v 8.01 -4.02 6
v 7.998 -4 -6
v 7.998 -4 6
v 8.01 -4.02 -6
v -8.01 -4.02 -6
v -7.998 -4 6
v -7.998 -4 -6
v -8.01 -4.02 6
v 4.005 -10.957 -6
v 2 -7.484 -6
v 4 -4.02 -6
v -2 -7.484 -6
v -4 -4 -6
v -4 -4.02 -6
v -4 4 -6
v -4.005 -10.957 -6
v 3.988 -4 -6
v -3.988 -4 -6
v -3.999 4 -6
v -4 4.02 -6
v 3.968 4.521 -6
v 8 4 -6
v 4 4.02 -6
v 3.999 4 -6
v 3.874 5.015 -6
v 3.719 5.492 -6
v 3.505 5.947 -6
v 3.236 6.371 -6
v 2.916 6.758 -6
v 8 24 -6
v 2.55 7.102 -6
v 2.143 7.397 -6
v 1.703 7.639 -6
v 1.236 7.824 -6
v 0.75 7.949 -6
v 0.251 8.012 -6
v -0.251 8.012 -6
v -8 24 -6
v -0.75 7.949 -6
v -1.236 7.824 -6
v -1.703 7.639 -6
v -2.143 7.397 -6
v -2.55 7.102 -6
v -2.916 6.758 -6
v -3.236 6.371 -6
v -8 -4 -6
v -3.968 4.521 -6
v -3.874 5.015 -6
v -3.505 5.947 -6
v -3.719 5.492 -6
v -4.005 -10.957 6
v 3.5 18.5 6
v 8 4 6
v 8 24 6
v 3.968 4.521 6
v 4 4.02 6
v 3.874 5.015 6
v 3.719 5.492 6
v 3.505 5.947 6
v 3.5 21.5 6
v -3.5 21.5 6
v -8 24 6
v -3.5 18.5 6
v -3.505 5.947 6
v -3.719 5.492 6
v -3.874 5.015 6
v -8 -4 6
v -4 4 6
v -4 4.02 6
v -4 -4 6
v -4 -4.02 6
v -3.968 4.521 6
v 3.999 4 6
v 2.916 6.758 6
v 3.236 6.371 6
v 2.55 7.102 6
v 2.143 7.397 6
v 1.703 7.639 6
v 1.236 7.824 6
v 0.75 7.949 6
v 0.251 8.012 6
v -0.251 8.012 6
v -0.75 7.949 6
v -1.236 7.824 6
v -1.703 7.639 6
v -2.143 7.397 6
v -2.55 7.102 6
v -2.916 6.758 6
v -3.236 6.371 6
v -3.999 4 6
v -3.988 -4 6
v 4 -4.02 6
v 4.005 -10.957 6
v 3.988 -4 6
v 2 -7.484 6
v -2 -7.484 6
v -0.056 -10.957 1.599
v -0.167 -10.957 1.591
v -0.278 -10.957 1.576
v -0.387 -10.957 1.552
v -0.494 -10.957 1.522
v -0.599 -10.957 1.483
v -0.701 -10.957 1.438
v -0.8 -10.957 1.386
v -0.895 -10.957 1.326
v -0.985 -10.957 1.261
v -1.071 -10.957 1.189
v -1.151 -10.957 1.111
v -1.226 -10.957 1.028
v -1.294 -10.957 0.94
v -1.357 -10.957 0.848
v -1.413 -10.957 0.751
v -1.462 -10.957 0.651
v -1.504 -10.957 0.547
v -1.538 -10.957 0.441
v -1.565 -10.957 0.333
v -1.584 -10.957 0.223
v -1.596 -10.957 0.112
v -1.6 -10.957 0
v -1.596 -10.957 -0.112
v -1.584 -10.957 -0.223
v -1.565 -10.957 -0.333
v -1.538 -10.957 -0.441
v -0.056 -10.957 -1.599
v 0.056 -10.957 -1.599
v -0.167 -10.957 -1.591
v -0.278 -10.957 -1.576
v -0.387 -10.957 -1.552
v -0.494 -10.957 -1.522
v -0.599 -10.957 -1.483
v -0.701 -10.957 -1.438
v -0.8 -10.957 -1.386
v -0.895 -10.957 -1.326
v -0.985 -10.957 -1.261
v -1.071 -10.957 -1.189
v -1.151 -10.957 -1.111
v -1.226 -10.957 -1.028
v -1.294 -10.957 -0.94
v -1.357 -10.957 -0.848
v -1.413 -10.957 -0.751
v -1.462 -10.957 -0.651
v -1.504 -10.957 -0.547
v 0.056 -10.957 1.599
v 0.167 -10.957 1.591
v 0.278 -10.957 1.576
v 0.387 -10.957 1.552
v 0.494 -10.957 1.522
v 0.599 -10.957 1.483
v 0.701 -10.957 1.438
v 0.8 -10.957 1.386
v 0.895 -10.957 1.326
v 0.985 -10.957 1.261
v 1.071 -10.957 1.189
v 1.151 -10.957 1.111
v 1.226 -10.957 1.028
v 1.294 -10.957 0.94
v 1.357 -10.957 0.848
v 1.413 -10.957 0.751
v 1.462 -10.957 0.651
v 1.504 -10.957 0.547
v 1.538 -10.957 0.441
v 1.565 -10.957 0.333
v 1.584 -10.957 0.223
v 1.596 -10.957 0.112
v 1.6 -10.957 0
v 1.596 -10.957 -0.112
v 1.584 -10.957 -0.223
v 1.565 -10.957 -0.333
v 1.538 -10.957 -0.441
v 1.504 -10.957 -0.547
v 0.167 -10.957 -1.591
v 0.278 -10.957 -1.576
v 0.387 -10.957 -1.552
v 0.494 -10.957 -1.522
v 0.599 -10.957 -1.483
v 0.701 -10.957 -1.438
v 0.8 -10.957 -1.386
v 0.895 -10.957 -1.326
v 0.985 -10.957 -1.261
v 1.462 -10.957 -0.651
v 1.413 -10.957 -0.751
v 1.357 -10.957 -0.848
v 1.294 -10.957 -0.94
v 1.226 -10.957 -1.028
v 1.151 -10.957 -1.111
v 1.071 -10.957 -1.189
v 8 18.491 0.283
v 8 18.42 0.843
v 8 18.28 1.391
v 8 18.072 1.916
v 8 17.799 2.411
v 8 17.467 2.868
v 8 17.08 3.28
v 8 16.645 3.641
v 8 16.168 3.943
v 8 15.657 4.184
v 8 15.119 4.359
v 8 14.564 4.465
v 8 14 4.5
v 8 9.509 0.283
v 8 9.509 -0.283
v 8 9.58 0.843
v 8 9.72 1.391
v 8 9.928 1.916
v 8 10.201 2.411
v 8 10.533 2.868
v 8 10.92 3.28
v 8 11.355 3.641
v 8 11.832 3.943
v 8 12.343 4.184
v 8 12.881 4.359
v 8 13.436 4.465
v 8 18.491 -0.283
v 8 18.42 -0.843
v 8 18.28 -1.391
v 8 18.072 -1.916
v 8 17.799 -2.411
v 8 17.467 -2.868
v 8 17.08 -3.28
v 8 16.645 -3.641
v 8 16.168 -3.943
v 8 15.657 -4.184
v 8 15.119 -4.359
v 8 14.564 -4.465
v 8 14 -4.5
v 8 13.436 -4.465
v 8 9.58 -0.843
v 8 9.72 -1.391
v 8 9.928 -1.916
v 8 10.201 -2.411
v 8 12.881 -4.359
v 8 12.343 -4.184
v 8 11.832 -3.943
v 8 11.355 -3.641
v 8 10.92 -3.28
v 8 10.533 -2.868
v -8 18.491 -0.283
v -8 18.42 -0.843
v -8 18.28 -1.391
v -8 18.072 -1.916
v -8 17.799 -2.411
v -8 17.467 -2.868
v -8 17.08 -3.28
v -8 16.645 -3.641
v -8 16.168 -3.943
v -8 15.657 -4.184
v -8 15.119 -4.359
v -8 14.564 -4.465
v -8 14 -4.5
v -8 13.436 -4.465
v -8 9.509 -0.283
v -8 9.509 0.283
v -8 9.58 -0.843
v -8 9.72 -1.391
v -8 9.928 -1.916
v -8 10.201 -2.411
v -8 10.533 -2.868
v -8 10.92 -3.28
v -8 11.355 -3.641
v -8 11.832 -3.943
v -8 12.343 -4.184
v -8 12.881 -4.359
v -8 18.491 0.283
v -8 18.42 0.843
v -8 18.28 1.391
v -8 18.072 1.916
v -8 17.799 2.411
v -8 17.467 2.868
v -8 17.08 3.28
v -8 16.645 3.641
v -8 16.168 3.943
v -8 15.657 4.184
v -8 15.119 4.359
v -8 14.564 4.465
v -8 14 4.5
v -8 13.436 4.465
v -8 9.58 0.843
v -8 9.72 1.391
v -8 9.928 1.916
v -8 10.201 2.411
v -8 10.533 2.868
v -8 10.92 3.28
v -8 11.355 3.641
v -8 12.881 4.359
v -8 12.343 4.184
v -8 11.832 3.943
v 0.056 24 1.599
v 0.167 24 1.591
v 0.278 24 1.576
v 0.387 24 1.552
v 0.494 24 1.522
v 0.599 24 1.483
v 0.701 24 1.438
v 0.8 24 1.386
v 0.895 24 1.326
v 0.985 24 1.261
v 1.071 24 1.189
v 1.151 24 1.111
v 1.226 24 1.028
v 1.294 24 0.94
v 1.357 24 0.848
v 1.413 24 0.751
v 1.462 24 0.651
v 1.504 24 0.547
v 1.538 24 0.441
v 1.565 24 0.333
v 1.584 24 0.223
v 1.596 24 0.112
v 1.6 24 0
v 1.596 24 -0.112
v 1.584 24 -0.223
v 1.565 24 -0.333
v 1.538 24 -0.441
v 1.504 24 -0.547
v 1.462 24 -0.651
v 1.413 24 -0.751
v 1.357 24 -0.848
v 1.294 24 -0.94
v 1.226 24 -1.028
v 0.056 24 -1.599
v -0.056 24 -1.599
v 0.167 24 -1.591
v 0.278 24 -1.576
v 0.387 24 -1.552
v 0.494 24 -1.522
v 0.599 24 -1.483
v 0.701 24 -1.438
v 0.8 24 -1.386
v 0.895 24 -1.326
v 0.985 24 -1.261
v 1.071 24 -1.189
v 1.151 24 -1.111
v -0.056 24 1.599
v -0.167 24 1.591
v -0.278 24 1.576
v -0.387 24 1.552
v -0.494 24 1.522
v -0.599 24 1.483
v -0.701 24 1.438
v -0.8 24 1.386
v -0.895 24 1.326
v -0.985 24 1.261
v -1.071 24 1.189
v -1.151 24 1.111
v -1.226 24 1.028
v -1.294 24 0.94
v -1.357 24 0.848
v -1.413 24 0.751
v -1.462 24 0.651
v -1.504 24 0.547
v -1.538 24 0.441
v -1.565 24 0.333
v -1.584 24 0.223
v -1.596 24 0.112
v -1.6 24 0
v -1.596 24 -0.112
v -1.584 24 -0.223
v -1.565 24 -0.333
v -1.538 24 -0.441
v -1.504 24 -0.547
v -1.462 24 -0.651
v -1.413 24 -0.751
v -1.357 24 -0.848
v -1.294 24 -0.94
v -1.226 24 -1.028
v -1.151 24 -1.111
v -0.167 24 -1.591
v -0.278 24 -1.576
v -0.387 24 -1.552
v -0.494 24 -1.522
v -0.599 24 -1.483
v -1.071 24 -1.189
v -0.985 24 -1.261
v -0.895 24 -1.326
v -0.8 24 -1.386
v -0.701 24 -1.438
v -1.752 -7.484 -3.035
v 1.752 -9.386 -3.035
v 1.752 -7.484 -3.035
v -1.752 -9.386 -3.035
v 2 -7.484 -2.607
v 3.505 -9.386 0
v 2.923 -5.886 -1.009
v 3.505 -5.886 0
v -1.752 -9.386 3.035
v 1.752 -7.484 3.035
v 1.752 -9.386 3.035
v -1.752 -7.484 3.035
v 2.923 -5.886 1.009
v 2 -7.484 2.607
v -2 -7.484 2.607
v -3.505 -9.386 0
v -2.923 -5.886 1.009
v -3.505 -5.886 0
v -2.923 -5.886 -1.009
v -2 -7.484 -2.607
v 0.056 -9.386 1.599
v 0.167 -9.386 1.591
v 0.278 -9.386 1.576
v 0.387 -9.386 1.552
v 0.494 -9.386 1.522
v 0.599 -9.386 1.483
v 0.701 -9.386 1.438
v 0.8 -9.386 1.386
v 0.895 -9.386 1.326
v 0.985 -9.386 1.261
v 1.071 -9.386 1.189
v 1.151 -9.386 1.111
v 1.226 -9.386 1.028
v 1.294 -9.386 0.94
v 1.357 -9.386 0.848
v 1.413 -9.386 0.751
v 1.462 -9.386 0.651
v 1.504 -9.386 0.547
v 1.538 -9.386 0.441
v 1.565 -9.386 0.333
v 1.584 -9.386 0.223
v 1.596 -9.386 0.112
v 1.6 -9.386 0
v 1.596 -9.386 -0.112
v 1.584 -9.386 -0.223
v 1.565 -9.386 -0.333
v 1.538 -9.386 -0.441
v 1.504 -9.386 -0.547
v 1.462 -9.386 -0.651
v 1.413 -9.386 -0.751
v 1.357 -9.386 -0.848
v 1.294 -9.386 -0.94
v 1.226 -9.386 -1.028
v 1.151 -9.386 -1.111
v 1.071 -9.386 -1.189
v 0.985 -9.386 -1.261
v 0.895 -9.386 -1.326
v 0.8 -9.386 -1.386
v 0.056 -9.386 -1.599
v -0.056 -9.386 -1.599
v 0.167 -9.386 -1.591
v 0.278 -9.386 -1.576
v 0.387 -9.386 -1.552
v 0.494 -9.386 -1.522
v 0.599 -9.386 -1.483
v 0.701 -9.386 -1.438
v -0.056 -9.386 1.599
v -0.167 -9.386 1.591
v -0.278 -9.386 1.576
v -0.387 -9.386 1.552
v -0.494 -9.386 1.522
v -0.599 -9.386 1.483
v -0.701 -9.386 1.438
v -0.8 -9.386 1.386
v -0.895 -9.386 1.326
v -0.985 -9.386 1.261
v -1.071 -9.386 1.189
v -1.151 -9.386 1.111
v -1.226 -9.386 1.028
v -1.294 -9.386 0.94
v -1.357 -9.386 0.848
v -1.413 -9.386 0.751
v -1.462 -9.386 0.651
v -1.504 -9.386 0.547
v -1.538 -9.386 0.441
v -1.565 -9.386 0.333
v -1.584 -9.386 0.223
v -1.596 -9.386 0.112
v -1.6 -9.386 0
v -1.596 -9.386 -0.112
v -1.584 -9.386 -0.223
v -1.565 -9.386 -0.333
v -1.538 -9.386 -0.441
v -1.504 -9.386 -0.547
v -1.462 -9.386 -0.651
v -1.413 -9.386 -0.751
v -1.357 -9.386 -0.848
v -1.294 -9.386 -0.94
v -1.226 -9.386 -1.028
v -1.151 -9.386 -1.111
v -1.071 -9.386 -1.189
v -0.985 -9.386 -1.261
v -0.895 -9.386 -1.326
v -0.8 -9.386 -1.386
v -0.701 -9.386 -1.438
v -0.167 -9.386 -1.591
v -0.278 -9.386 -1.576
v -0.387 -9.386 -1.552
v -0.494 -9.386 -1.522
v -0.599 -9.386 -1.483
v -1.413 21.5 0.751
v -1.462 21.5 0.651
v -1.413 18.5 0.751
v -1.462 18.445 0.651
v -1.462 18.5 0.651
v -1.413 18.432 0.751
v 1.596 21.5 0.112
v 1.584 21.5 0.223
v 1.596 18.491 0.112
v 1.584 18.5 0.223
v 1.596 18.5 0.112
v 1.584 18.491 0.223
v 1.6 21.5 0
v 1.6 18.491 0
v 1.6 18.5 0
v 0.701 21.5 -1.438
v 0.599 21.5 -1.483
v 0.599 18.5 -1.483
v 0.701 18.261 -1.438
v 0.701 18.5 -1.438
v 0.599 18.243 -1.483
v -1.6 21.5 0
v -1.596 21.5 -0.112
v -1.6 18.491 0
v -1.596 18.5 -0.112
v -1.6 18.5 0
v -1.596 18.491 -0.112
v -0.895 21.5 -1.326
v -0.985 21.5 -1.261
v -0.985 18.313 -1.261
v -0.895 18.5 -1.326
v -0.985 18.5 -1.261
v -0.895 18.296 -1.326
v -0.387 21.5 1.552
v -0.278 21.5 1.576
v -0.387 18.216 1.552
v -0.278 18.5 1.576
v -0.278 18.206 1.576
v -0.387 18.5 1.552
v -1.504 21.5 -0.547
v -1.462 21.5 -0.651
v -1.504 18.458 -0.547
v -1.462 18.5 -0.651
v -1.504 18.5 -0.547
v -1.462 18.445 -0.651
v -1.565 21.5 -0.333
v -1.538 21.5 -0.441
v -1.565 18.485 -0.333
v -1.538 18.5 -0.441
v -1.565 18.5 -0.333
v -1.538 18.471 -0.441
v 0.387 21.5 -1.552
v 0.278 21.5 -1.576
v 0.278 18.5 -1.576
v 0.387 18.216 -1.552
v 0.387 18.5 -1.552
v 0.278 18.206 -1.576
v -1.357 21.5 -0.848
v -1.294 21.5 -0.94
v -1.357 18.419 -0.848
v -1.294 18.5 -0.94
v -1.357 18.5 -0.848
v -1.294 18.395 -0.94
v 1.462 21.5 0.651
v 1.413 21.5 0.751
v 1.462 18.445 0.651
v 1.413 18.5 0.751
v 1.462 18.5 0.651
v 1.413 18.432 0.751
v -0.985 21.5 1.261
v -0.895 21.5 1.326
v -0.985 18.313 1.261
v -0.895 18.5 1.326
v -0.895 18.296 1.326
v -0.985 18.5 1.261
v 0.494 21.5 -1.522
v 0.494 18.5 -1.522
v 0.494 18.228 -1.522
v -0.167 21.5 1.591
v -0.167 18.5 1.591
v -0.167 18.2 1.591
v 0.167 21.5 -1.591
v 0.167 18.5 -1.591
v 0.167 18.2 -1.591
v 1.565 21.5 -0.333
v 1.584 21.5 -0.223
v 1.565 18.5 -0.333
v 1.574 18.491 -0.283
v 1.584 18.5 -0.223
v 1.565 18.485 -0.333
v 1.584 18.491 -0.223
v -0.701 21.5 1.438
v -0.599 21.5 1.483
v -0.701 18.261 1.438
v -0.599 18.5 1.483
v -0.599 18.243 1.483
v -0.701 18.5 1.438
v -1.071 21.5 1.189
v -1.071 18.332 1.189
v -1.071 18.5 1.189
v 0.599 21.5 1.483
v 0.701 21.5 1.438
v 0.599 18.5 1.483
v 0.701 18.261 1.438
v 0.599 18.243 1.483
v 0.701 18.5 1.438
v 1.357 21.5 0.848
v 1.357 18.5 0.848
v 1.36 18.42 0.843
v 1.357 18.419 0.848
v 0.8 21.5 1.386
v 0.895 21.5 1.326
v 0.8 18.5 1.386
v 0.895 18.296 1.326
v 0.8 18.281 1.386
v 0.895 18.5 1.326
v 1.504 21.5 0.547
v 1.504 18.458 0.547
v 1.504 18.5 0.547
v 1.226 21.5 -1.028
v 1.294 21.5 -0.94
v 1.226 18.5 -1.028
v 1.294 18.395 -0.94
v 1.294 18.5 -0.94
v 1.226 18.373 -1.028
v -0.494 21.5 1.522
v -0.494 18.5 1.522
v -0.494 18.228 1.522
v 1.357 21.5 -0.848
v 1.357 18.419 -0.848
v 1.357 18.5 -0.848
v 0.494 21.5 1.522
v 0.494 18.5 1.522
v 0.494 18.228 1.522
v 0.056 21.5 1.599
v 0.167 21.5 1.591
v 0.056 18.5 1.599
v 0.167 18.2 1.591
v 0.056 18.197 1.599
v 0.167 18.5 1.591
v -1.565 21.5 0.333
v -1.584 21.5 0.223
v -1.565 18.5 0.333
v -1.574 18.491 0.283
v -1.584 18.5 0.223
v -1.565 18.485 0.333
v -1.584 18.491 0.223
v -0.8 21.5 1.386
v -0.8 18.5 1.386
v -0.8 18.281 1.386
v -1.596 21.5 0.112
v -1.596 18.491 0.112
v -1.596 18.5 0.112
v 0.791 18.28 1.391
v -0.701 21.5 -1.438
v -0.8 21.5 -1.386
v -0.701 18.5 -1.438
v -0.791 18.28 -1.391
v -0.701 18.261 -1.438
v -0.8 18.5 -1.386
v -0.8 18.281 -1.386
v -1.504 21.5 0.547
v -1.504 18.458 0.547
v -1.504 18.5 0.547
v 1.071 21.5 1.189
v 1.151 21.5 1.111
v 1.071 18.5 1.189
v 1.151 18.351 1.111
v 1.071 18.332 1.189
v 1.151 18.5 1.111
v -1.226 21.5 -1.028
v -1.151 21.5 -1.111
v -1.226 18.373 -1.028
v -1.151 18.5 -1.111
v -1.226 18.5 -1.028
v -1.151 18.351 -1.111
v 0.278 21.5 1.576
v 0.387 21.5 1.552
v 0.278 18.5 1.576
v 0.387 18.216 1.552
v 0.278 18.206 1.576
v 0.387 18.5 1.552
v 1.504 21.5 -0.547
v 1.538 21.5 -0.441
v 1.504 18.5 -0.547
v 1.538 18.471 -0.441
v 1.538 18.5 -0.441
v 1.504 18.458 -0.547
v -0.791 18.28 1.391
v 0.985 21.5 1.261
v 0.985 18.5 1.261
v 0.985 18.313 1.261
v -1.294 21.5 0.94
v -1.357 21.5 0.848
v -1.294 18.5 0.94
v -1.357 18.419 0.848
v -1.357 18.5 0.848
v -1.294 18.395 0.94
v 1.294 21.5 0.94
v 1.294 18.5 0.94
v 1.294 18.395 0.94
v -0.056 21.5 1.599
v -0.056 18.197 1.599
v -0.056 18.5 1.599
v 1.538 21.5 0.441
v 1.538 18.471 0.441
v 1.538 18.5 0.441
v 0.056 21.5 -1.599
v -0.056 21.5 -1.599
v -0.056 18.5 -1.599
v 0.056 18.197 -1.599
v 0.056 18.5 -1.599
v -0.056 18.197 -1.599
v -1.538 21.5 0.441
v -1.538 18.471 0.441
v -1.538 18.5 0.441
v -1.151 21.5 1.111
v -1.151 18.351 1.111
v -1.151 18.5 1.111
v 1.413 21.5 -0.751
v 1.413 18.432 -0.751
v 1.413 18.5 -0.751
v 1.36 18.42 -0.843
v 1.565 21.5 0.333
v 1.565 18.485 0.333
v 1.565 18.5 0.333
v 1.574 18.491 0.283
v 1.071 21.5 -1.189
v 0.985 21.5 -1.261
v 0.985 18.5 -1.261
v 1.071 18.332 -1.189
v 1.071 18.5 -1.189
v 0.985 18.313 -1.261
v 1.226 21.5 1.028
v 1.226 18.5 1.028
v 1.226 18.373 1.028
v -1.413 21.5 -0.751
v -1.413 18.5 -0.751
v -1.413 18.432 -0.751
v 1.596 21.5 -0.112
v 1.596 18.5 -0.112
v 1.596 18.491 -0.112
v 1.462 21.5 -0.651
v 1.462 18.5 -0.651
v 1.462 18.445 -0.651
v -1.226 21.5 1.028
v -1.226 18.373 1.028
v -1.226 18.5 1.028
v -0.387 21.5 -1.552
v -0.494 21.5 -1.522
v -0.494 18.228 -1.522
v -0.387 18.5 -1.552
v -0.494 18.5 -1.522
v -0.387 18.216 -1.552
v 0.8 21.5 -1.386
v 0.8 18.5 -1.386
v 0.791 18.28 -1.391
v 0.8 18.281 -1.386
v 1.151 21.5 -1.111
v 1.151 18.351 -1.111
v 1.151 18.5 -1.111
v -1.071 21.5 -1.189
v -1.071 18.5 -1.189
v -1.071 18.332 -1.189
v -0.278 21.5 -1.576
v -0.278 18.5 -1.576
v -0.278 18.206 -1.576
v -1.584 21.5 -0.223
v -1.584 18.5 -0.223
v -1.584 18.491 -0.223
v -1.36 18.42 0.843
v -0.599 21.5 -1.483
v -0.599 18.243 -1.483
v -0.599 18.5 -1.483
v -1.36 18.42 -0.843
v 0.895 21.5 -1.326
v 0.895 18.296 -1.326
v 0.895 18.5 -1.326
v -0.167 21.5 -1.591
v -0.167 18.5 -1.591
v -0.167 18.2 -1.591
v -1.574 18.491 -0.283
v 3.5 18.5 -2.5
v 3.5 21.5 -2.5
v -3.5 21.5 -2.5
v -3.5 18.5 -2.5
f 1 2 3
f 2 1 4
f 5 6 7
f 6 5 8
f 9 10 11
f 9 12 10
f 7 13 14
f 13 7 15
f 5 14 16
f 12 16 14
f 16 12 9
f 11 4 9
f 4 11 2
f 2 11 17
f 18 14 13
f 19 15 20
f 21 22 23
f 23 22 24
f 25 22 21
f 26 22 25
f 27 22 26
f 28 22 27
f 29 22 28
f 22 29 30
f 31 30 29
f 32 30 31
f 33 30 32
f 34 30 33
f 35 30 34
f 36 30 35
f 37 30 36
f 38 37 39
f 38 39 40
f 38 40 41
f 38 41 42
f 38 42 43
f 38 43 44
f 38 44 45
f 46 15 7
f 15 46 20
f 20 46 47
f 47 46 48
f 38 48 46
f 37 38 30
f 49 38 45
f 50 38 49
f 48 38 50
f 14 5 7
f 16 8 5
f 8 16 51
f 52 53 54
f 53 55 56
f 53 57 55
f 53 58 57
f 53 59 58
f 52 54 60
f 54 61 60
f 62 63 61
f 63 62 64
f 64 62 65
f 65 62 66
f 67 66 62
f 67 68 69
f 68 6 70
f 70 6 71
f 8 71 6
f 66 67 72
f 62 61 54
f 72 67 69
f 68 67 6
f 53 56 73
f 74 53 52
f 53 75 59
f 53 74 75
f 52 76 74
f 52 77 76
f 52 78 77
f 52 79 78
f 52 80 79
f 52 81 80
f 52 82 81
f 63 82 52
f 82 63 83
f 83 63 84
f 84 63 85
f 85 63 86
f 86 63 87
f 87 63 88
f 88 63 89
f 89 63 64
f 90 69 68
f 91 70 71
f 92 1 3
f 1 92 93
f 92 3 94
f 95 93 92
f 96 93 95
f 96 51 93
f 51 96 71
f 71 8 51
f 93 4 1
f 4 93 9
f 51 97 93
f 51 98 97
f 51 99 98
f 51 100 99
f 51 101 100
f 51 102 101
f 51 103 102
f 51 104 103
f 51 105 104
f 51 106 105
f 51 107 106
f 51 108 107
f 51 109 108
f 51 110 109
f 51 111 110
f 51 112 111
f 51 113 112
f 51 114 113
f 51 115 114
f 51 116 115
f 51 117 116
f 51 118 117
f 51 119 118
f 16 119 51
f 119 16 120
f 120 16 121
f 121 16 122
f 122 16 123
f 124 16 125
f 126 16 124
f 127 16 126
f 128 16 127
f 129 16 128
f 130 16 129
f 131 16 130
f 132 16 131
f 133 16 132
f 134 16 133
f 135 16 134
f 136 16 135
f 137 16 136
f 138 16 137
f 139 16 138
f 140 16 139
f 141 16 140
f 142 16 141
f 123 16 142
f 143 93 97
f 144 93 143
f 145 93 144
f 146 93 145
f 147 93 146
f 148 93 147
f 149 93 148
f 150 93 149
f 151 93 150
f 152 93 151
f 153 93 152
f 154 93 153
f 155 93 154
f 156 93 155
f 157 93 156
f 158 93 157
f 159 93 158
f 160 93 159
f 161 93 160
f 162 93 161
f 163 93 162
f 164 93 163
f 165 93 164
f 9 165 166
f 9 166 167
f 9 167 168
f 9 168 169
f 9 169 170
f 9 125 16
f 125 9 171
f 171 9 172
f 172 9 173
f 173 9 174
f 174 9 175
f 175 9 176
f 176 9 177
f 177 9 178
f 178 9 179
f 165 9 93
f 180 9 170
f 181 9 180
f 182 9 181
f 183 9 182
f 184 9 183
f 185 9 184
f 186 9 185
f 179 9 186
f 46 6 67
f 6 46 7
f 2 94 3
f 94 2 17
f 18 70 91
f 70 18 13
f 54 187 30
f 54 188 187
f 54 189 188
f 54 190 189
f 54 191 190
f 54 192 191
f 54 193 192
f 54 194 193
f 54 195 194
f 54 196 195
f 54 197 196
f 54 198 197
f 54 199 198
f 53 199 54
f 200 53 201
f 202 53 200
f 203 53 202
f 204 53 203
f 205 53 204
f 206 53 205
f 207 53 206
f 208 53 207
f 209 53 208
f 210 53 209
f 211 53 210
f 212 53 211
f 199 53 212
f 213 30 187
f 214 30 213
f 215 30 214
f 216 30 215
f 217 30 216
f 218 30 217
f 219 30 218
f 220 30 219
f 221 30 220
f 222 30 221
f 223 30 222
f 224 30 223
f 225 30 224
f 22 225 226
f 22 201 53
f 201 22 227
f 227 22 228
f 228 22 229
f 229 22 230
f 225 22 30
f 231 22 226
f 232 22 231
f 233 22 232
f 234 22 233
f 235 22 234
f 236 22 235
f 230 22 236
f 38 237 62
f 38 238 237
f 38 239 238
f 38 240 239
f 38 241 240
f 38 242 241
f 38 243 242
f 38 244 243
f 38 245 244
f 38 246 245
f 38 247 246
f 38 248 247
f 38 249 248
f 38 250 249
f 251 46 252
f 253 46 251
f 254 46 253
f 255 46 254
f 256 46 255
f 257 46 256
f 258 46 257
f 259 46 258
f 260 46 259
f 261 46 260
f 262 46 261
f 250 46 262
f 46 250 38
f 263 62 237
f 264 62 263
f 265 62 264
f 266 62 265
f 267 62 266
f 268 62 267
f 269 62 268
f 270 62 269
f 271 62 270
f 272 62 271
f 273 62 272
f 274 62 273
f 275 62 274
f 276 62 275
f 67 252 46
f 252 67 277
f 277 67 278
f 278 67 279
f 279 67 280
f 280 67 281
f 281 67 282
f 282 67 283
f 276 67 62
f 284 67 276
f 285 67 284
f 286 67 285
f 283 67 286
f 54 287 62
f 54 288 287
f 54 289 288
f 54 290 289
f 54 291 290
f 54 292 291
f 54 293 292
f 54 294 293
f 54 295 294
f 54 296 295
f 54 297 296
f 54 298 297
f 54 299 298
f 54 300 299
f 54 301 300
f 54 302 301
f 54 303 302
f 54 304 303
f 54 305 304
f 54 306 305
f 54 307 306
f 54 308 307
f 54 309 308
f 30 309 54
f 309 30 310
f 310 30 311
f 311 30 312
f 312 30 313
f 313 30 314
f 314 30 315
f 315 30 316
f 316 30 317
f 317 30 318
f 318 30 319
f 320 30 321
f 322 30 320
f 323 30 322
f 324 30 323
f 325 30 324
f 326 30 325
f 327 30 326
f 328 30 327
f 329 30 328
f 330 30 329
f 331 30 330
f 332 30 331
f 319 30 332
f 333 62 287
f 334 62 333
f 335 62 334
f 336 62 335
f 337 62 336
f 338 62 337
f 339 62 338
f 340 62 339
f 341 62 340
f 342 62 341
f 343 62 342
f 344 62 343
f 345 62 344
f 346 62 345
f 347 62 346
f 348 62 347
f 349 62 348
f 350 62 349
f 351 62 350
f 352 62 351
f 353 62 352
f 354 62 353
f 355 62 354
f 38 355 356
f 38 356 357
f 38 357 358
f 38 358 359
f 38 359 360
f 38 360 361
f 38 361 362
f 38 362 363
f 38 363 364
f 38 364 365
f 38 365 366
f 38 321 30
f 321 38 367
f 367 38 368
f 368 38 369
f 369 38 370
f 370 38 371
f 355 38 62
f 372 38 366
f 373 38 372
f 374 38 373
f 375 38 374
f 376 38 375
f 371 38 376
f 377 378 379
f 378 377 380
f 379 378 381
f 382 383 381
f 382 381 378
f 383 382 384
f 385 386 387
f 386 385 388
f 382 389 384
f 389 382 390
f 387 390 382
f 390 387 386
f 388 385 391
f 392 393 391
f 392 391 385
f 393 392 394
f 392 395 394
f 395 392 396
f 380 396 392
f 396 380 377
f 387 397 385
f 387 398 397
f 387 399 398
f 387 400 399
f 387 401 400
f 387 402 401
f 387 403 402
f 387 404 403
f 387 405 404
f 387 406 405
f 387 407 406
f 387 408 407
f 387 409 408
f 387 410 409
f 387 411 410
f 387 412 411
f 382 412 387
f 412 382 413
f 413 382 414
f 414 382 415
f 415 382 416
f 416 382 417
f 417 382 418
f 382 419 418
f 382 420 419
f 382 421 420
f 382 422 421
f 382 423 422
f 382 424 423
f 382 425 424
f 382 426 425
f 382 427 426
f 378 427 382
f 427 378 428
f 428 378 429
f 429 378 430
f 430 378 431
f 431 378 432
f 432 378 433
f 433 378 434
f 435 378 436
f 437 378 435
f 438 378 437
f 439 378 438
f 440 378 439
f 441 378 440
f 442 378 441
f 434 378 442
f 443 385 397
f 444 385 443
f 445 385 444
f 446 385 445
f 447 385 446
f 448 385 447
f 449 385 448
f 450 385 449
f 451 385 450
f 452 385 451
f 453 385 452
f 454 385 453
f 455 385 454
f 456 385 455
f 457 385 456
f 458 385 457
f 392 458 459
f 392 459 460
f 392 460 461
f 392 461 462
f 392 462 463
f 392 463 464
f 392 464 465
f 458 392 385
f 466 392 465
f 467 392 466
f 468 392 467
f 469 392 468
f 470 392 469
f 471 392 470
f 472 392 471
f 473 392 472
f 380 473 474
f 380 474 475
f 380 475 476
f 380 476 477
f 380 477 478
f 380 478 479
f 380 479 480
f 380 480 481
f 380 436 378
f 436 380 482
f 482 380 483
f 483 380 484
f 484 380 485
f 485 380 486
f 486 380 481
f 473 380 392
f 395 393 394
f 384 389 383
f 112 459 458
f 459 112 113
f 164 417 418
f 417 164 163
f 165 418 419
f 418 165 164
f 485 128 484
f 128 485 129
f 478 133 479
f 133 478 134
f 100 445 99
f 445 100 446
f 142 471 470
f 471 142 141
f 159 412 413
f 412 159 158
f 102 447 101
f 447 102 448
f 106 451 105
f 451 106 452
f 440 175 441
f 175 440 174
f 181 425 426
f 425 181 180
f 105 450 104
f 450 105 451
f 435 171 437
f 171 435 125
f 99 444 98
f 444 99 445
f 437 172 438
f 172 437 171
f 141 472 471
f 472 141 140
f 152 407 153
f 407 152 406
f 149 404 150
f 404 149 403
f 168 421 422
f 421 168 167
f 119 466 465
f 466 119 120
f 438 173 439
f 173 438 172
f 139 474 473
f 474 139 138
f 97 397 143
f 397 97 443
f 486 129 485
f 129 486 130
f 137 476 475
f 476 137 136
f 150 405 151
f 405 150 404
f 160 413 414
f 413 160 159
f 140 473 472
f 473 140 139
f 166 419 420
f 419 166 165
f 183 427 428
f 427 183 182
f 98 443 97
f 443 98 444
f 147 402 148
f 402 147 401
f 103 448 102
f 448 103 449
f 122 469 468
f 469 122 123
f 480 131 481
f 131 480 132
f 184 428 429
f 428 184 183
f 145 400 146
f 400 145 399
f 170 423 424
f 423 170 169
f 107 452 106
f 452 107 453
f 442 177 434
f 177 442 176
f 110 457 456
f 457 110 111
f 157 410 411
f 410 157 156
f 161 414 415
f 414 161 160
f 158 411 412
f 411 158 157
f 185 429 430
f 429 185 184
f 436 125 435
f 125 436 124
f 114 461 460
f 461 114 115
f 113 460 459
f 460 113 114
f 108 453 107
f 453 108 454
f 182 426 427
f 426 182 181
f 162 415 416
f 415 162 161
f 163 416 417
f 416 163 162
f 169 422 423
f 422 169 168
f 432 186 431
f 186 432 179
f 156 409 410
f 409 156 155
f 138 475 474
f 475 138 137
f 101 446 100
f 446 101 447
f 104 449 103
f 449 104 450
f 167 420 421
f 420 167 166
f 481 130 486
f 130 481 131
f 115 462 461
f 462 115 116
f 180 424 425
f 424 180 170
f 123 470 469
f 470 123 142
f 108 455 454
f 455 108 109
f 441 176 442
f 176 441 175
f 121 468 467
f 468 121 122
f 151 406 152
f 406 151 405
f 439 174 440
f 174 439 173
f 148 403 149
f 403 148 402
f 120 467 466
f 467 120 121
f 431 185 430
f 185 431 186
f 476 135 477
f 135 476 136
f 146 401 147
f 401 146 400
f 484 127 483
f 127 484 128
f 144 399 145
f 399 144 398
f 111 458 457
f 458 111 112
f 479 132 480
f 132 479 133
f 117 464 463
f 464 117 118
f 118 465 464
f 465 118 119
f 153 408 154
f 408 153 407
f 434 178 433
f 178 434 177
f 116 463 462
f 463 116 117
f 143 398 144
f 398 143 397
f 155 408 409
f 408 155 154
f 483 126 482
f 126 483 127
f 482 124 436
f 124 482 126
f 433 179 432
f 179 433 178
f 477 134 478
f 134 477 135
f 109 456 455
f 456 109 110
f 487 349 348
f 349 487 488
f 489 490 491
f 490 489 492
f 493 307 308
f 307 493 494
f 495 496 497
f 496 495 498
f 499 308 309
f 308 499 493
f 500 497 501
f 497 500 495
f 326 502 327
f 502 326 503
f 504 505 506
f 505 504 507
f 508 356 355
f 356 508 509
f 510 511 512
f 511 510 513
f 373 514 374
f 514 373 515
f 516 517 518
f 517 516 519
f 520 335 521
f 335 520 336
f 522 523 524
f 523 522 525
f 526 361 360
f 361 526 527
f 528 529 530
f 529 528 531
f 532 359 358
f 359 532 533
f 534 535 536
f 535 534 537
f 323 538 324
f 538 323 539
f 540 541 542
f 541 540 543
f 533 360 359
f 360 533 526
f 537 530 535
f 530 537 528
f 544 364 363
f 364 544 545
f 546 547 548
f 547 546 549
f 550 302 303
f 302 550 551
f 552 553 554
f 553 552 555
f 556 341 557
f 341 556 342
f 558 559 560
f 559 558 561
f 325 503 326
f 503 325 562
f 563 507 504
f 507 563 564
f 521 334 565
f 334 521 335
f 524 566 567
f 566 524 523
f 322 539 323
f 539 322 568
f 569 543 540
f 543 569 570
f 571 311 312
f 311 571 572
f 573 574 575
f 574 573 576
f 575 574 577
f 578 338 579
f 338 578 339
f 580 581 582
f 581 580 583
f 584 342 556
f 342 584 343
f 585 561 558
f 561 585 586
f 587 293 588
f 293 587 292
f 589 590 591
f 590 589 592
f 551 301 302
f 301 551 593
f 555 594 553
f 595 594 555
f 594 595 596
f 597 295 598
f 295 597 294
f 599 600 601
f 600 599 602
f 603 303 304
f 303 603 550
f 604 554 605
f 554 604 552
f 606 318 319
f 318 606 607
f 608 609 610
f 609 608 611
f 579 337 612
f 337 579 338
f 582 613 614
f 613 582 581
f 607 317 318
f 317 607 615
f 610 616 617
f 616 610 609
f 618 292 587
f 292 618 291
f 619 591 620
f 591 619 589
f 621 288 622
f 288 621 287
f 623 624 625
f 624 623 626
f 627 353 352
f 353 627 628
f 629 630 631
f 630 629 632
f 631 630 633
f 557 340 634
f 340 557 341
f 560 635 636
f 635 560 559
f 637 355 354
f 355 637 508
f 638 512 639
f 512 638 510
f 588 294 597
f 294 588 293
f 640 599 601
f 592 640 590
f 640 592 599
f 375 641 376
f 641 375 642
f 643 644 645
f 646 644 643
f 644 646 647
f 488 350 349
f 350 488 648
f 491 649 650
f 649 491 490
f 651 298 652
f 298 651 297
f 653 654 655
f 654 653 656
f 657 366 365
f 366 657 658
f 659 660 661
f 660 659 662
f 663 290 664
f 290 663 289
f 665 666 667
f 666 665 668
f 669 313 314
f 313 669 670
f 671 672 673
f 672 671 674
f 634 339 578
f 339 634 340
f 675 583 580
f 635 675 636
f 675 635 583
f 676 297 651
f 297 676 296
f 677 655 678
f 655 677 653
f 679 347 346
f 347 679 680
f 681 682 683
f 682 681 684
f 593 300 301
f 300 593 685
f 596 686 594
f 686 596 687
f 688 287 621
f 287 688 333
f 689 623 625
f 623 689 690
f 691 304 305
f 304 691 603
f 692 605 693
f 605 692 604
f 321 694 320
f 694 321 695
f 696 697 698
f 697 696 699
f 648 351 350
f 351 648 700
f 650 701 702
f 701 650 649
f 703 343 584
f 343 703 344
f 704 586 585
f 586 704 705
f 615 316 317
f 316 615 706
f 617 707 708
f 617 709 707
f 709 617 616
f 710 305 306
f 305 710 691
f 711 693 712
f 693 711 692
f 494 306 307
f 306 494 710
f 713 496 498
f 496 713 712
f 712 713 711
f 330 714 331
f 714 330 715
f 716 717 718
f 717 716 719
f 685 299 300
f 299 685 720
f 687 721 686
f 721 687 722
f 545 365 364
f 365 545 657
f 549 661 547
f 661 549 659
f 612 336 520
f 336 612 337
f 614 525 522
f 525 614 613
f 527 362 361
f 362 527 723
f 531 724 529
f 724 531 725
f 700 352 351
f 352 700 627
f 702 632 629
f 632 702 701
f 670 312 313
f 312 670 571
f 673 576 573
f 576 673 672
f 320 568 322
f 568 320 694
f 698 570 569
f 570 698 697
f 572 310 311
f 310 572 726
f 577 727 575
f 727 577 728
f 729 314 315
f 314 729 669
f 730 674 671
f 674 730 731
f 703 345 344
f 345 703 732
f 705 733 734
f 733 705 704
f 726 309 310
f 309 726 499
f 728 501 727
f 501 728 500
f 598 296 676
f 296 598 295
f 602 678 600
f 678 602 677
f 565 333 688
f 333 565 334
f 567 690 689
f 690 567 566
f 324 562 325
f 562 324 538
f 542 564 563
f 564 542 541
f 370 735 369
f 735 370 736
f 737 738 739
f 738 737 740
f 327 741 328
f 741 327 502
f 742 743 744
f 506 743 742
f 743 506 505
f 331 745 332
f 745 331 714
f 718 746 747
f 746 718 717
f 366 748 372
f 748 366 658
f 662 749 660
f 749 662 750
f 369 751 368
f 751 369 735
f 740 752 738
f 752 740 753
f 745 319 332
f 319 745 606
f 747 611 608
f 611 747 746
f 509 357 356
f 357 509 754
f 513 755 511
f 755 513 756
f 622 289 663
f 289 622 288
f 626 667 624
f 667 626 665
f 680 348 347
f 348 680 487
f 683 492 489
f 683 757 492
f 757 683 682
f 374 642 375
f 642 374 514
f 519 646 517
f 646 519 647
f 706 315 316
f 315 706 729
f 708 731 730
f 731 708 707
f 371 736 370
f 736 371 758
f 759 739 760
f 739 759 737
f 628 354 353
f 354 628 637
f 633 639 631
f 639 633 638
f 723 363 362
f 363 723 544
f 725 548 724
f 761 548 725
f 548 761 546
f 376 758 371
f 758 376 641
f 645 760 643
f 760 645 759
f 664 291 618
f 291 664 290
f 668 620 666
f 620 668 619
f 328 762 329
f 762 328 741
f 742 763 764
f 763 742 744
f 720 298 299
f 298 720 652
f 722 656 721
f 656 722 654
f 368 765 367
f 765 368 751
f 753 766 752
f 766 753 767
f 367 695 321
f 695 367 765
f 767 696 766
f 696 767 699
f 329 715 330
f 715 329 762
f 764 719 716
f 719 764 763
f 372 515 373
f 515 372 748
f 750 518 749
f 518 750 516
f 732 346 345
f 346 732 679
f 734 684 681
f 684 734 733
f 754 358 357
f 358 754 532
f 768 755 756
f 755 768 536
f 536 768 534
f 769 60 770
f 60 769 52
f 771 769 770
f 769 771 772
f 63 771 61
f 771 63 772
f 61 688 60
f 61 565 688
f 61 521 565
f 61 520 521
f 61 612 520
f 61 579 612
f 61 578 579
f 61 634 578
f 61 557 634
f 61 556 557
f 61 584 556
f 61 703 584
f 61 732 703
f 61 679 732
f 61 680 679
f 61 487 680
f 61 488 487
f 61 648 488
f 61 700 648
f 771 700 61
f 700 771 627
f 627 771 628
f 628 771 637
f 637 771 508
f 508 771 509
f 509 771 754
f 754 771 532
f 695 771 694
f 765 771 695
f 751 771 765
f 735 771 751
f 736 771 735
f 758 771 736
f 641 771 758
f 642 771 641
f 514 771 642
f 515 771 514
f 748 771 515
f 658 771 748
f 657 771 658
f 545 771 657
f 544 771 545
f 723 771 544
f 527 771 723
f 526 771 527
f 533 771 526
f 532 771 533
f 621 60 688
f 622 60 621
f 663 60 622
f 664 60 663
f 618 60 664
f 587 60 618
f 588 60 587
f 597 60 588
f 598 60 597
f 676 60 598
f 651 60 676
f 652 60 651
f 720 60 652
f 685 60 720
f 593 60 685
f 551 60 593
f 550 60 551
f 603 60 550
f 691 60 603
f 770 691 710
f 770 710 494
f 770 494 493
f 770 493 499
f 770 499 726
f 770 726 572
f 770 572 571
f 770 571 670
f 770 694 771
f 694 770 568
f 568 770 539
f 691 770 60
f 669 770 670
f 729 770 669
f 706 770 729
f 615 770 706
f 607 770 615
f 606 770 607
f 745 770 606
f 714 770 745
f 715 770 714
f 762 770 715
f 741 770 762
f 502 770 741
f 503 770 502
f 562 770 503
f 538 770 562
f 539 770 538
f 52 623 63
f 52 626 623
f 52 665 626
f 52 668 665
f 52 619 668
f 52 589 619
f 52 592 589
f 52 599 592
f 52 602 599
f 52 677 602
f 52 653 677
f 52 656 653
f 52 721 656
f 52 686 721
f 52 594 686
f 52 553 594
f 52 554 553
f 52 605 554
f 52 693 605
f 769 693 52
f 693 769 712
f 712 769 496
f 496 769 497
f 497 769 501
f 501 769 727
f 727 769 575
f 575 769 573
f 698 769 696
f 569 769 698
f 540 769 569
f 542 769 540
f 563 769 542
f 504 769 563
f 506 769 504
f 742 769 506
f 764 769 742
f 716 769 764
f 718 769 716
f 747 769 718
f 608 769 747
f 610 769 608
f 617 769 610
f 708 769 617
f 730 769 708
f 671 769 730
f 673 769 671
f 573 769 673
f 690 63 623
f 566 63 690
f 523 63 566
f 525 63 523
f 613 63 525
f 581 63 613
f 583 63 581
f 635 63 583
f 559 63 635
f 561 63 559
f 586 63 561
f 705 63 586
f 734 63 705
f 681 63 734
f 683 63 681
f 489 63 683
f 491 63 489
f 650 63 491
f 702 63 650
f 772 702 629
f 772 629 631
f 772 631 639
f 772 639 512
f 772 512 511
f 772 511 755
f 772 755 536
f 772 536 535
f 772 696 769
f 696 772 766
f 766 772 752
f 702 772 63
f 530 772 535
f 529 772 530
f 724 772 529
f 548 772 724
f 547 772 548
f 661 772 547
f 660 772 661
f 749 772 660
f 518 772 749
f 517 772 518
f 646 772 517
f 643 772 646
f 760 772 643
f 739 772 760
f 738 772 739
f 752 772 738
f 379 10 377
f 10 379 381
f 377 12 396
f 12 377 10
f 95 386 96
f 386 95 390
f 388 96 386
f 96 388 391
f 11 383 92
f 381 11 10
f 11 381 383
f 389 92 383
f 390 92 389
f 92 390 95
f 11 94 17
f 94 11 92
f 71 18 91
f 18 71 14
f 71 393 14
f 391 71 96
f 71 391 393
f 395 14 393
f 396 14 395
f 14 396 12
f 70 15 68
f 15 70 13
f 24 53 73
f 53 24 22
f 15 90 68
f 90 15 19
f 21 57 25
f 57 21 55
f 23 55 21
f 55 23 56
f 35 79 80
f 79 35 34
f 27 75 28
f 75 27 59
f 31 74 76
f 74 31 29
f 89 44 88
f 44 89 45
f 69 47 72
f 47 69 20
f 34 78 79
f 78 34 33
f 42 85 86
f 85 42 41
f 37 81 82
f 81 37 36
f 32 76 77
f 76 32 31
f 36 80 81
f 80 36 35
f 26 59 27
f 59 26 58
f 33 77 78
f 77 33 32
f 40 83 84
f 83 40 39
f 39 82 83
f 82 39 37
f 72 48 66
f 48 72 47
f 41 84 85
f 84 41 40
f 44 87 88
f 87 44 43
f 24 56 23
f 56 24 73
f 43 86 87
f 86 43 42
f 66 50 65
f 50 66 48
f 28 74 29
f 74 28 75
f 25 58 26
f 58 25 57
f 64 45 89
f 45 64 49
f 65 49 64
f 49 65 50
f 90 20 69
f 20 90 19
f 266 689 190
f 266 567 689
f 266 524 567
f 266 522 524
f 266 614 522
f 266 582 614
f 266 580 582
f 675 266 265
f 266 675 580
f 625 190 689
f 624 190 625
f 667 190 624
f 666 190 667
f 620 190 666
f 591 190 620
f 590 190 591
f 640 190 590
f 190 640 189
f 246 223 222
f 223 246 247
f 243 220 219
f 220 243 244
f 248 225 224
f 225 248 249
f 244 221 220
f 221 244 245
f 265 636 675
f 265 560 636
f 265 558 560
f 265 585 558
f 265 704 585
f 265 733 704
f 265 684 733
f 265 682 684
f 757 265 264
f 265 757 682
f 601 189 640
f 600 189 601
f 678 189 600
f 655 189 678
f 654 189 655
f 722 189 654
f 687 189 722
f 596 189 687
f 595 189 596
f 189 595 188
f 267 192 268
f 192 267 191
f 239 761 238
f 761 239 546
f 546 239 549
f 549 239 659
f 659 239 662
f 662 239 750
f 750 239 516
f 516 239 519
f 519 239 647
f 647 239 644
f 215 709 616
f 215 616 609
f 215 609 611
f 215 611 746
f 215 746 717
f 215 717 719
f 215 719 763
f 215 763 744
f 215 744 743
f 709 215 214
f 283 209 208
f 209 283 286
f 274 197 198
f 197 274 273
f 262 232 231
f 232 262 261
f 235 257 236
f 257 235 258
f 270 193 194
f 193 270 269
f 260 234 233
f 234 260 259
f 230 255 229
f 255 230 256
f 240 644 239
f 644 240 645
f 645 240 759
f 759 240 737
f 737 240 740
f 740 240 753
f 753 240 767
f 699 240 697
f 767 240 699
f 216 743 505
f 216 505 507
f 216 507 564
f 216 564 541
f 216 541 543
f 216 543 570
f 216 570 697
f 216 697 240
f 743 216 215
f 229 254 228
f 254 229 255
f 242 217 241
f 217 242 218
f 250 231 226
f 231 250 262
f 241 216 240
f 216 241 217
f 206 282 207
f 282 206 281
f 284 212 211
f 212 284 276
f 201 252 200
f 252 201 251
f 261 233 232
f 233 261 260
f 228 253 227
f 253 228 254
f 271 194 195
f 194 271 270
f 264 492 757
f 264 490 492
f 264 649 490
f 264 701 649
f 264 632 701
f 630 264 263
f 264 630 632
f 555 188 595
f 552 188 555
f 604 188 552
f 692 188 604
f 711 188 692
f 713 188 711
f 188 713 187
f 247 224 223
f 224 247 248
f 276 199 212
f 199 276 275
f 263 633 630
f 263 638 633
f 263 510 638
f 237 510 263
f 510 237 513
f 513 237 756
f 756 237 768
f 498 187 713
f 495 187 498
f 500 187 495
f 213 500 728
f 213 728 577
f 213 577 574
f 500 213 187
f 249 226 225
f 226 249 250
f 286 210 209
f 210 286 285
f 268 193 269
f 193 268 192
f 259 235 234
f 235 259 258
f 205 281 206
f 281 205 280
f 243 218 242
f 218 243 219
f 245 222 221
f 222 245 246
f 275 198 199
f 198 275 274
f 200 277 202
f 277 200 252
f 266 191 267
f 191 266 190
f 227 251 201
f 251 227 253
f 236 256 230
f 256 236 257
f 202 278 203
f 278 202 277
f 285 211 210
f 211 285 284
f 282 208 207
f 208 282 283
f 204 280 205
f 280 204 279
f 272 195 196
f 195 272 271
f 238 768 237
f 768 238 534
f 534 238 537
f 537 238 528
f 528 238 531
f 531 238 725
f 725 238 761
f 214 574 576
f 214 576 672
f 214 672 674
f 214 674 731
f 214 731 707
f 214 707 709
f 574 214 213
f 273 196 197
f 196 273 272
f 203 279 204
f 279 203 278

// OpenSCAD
difference() {
  difference() {
    difference() {
      difference() {
        difference() {
          union() {
            difference() {
              union() {
                translate(v=[0.000, -4.020, 0.000]) {
                rotate([-180.000,-180.000,-180.000]){
                  cylinder(h=12.000, r1=8.010, r2=8.010, $fn=6, center=true);
                } // End rotate
                } // End translate
                cube(size=[15.990, 8.000, 12.000], center=true);
                translate(v=[0.000, 10.000, 0.000]) {
                rotate([-180.000,-180.000,-180.000]){
                  cube(size=[16.000, 28.000, 12.000], center=true);
                } // End rotate
                } // End translate
              } // End union
              translate(v=[0.000, -7.636, 0.000]) {
              rotate([-90.000,-180.000,-180.000]){
                union() {
                  cylinder(h=3.500, r1=3.505, r2=3.505, $fn=6, center=true);
                  cylinder(h=10.000, r1=1.600, r2=1.600, $fn=90, center=true);
                } // End union
              } // End rotate
              } // End translate
            } // End difference
            color([0.150, 0.150, 0.150, 1.000]) {
              translate(v=[0.000, 20.000, 0.000]) {
              rotate([-90.000,-180.000,-180.000]){
                cylinder(h=3.000, r1=3.505, r2=3.505, $fn=6, center=true);
              } // End rotate
              } // End translate
            } // End color
          } // End union
          translate(v=[0.000, 20.000, 0.000]) {
          rotate([-90.000,-180.000,-180.000]){
            cylinder(h=15.000, r1=1.600, r2=1.600, $fn=90, center=true);
          } // End rotate
          } // End translate
        } // End difference
        translate(v=[-0.000, 20.000, 4.000]) {
        rotate([-180.000,-180.000,-180.000]){
          cube(size=[7.000, 3.000, 13.000], center=true);
        } // End rotate
        } // End translate
      } // End difference
      translate(v=[0.000, -4.020, 0.000]) {
      rotate([-180.000,-180.000,-180.000]){
        cylinder(h=16.000, r1=4.000, r2=4.000, $fn=6, center=true);
      } // End rotate
      } // End translate
      translate(v=[6.000, 0.000, 0.000]) {
      rotate([-180.000,-180.000,-180.000]){
        cube(size=[20.000, 8.000, 16.000], center=true);
      } // End rotate
      } // End translate
      translate(v=[0.000, 4.020, 0.000]) {
      rotate([-180.000,-180.000,-180.000]){
        cylinder(h=16.000, r1=4.000, r2=4.000, $fn=50, center=true);
      } // End rotate
      } // End translate
    } // End difference
    color([0.150, 0.150, 0.150, 1.000]) {
      translate(v=[0.000, 14.000, 0.000]) {
      rotate([-146.310,90.000,-146.310]){
        cylinder(h=25.000, r1=4.500, r2=4.500, $fn=50, center=true);
      } // End rotate
      } // End translate
    } // End color
  } // End difference
  color([0.150, 0.150, 0.150, 1.000]) {
    translate(v=[0.000, 4.020, 0.000]) {
    rotate([-180.000,-180.000,-180.000]){
      cylinder(h=25.000, r1=4.000, r2=4.000, $fn=50, center=true);
    } // End rotate
    } // End translate
  } // End color
} // End difference
